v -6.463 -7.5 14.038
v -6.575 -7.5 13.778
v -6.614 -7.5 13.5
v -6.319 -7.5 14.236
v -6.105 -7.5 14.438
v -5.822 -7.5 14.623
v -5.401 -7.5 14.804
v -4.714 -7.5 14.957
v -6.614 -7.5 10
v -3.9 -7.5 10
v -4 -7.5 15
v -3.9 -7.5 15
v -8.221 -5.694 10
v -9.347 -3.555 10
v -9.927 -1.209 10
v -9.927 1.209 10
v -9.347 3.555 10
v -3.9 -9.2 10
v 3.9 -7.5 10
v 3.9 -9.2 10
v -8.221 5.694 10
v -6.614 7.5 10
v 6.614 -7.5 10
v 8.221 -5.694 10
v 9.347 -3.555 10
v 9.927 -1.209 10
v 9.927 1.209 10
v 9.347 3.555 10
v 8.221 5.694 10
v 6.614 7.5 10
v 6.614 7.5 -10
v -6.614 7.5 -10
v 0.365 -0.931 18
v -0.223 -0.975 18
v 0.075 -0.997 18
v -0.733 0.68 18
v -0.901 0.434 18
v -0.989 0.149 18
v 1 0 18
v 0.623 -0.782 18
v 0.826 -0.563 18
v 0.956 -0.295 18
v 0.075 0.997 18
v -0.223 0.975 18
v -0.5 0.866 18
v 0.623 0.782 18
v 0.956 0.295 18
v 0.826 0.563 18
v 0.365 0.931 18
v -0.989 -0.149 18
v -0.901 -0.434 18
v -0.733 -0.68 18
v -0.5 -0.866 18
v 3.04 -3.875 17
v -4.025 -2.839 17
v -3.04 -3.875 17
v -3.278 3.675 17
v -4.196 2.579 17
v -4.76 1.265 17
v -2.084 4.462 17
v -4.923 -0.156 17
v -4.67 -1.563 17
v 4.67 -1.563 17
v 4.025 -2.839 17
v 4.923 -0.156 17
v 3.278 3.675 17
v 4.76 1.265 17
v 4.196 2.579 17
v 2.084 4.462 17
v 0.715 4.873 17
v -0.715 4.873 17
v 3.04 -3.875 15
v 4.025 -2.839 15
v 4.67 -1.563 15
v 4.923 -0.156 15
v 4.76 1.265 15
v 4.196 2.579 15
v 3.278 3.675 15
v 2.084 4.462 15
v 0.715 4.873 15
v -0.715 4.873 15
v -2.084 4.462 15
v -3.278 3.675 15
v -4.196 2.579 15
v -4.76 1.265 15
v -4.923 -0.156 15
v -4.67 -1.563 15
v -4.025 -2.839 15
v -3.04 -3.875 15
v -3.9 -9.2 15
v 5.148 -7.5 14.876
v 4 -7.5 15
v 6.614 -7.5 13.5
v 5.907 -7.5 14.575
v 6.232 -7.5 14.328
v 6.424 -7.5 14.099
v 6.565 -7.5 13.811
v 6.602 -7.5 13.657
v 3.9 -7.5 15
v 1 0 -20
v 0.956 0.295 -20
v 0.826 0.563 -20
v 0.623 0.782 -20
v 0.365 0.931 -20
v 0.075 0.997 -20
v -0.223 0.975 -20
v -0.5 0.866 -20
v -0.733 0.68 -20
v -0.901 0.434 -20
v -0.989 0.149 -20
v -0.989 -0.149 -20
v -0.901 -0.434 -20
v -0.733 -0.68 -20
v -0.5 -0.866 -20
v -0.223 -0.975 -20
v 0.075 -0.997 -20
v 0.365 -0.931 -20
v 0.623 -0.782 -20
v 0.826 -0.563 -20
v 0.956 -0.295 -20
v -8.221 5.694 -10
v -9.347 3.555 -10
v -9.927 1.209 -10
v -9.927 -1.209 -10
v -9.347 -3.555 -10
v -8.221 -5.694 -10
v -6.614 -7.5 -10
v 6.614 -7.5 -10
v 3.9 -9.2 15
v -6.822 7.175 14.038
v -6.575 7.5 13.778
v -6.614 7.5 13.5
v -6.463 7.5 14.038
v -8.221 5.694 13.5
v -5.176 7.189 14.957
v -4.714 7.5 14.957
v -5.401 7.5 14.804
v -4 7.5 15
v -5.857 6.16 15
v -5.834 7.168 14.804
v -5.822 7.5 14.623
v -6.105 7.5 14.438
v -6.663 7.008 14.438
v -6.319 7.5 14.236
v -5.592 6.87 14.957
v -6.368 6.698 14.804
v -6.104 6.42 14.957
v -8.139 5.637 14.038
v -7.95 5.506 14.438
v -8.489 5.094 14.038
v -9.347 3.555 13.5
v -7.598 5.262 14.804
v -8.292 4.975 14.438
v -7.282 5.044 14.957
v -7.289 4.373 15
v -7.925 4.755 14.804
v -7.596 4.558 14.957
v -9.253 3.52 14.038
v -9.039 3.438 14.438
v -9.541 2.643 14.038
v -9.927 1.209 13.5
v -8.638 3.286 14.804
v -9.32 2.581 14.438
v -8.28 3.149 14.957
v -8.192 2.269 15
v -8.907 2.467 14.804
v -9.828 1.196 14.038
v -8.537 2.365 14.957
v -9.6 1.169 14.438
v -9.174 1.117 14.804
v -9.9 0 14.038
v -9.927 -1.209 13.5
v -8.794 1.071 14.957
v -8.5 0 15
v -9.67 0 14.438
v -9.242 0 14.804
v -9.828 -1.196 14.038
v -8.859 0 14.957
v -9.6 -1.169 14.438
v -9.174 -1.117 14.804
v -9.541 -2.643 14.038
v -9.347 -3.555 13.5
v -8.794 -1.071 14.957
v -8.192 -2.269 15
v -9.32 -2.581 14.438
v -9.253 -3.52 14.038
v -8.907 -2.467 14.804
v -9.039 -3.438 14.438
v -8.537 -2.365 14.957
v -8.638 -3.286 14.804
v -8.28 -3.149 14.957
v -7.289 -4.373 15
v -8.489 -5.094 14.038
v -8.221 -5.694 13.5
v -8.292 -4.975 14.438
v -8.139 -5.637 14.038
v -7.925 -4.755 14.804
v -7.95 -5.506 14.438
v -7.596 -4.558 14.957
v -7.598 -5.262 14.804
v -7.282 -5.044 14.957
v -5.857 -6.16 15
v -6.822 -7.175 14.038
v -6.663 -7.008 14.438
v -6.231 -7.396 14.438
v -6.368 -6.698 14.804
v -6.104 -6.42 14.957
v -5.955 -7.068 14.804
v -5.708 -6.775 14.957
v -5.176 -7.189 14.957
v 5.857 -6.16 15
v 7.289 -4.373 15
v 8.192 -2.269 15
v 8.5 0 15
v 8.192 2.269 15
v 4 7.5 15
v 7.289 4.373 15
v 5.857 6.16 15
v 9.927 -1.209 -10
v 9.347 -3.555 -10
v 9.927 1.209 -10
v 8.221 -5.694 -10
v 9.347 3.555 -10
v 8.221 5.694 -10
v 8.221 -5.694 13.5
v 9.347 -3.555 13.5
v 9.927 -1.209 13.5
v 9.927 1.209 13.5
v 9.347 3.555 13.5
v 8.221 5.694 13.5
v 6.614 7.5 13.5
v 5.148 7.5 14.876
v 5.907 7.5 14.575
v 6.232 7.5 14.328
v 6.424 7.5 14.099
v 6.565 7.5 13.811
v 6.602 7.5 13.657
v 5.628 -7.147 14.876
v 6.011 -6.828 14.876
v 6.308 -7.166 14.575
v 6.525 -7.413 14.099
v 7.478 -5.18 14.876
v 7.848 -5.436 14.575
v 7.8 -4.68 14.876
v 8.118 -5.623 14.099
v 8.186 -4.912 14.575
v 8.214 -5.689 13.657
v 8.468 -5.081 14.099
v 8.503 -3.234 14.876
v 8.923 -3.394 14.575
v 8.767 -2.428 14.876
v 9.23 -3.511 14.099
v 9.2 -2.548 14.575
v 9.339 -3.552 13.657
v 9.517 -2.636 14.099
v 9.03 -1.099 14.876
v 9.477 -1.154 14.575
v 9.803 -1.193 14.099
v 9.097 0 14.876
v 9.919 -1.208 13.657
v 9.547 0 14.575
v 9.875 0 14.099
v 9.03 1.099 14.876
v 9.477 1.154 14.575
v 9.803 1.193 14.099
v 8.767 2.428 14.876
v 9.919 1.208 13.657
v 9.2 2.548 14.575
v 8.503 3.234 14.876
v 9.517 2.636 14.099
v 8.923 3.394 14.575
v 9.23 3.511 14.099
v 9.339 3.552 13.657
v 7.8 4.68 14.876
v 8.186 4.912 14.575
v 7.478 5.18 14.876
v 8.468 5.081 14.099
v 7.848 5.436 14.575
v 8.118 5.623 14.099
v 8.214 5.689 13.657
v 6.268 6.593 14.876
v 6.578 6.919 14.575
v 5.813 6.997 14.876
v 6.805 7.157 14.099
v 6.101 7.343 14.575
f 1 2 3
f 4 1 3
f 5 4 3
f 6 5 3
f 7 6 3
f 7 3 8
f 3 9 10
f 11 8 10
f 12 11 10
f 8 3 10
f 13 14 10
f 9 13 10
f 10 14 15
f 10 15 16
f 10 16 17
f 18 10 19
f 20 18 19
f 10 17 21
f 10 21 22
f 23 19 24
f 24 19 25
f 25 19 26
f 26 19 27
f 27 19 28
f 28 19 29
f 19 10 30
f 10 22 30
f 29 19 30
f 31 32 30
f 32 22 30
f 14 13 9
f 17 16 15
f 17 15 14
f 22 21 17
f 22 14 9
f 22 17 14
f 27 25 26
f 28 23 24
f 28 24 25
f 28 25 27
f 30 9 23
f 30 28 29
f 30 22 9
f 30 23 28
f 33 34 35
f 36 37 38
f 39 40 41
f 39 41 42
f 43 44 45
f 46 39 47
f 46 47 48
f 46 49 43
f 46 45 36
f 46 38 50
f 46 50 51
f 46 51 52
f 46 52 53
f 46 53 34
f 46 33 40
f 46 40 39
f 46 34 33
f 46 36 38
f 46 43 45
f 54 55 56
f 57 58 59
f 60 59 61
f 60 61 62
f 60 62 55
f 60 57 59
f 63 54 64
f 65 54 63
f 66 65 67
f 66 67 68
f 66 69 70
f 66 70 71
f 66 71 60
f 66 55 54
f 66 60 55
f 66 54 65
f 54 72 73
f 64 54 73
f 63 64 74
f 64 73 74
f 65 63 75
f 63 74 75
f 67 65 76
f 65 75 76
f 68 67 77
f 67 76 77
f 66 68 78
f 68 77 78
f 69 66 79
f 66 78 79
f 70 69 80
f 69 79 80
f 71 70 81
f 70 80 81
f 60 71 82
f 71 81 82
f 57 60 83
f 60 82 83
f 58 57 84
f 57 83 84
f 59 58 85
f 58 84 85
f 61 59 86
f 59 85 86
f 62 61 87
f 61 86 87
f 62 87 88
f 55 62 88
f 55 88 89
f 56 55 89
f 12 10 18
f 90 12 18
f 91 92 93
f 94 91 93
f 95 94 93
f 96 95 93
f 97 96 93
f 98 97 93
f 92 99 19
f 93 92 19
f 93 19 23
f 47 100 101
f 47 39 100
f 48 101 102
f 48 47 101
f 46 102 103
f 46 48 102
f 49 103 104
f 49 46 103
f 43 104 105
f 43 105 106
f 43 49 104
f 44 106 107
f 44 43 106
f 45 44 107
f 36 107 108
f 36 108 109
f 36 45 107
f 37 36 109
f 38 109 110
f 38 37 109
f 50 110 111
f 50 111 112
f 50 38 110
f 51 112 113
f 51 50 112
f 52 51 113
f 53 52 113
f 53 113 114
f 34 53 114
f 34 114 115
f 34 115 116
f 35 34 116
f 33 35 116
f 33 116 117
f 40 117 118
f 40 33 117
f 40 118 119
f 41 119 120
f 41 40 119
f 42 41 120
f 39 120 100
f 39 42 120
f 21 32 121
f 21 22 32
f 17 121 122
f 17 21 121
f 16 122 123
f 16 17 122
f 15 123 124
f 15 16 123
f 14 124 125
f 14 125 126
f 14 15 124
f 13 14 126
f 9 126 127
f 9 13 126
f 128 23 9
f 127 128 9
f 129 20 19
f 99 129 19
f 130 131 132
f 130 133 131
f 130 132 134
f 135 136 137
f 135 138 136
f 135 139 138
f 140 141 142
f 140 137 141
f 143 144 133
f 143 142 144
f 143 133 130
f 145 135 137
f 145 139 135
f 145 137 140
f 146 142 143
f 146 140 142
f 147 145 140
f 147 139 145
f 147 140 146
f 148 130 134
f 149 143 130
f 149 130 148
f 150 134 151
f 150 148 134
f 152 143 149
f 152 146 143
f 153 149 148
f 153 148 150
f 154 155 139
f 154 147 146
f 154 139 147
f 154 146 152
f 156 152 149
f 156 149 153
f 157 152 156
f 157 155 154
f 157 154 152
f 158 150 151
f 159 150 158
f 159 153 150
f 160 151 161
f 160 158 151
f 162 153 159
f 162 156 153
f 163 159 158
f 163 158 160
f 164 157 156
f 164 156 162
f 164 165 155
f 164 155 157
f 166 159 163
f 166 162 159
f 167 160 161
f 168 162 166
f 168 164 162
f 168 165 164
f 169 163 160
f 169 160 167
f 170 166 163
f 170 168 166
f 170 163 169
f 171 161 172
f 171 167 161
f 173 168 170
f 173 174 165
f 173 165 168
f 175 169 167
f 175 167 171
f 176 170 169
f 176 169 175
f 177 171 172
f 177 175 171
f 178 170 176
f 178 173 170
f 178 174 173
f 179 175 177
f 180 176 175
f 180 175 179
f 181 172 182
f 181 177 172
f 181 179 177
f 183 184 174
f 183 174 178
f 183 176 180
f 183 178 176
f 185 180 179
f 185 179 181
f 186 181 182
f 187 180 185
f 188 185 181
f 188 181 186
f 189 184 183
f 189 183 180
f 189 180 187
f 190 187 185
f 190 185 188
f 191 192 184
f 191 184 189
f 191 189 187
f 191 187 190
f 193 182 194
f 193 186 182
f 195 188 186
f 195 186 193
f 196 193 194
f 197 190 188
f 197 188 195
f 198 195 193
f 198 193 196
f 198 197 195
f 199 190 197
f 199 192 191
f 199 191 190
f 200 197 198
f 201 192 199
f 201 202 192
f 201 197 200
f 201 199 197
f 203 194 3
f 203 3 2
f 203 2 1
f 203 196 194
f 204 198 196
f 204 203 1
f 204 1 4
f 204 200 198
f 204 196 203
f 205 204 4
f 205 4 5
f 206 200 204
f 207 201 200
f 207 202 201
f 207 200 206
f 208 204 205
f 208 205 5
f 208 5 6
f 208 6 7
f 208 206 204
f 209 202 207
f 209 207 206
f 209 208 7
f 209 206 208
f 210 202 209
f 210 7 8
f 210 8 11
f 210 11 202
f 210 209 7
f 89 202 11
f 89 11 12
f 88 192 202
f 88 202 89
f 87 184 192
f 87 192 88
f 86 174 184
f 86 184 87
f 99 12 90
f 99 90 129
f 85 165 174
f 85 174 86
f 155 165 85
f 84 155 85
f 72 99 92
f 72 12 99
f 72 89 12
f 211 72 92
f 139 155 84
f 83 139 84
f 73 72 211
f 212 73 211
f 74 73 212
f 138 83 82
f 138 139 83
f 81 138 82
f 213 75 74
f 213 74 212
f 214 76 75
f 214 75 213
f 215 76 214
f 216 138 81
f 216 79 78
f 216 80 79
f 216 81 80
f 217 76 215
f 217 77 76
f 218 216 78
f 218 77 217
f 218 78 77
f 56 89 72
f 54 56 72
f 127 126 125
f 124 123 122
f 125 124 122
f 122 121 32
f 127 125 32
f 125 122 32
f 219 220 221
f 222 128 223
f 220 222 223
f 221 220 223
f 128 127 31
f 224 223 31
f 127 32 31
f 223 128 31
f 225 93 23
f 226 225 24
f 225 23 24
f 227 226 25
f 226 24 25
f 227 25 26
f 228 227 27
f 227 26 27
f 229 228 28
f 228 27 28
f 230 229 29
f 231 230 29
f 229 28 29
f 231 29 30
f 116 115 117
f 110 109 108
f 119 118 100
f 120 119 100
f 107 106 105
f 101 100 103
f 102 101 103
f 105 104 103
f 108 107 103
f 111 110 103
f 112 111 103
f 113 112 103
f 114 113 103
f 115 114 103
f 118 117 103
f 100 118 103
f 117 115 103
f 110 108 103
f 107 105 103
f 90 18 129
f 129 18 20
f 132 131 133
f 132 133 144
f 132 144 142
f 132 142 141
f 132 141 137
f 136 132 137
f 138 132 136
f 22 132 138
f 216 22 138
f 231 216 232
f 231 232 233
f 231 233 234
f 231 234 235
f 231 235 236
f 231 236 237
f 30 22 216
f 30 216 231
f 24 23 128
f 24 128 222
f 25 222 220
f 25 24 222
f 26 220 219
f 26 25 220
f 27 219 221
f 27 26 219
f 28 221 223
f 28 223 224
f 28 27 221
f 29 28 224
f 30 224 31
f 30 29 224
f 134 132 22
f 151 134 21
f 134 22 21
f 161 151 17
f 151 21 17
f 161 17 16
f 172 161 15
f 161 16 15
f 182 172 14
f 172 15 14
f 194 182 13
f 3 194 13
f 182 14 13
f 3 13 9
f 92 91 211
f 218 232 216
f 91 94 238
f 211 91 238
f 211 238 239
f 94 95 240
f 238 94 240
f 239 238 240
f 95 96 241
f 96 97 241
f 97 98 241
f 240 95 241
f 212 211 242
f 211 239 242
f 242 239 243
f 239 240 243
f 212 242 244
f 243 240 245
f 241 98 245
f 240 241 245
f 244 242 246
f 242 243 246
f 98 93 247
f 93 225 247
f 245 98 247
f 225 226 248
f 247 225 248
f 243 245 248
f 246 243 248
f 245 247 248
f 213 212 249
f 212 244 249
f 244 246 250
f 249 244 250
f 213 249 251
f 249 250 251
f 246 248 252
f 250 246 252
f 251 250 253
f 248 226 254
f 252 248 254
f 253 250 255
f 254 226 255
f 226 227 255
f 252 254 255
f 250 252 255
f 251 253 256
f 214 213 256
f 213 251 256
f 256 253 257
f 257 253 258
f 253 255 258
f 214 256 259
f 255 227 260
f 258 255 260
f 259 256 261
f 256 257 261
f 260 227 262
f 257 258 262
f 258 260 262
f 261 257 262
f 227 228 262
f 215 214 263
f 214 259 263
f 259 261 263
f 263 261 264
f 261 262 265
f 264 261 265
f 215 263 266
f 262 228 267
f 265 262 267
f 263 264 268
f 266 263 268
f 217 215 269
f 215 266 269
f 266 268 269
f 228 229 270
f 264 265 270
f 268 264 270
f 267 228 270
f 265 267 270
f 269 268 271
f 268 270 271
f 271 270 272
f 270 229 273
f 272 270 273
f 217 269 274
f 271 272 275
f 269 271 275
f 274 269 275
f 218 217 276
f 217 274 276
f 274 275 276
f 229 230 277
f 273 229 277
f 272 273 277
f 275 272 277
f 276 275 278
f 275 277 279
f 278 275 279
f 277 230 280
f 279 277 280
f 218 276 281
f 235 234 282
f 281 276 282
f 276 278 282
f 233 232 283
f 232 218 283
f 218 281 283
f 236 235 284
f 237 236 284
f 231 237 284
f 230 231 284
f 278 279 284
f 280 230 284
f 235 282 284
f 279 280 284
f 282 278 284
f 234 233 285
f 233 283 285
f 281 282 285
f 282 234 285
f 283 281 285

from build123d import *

# Parameters (mm, degrees)
PAD_DEPTH         = 10
PAD001_DEPTH      = 5
PAD003_DEPTH      = 2
FILLET_R          = 1.5
SKETCH002_R       = 1
PAD002_DEPTH      = 18
PAD002_DEPTH_BACK = 20


with BuildPart() as metal:
    # Sketch → Pad (new body, symmetric)
    with BuildSketch(Plane.XY):
        with BuildLine():
            ThreePointArc((-6.614378, 7.5), (-10, 0), (-6.614378, -7.5))
            Line((6.614378, -7.5), (-6.614378, -7.5))
            ThreePointArc((6.614378, -7.5), (10, 0), (6.614378, 7.5))
            Line((-6.614378, 7.5), (6.614378, 7.5))
        make_face()
    extrude(amount=PAD_DEPTH, both=True)


with BuildPart() as plastic:
    # Sketch001 → Pad001 (new body)
    with BuildSketch(Plane.XY.offset(10)):
        with BuildLine():
            ThreePointArc((-6.614378, 7.5), (-10, 0), (-6.614378, -7.5))
            Line((-6.614378, -7.5), (-3.9, -7.5))
            Line((-3.9, -7.5), (-3.9, -9.2))
            Line((-3.9, -9.2), (3.9, -9.2))
            Line((3.9, -9.2), (3.9, -7.5))
            Line((3.9, -7.5), (6.614378, -7.5))
            ThreePointArc((6.614378, -7.5), (10, 0), (6.614378, 7.5))
            Line((-6.614378, 7.5), (6.614378, 7.5))
        make_face()
    extrude(amount=PAD001_DEPTH)

    # Sketch003 (on Face10 of Pad001) → Pad003 (join)
    with BuildSketch(Plane.XY.offset(15)):
        with BuildLine():
            ThreePointArc((3.039737, -3.875), (0, 4.925), (-3.039737, -3.875))
            Line((-3.039737, -3.875), (3.039737, -3.875))
        make_face()
    extrude(amount=PAD003_DEPTH)

    # Fillet
    fillet_edges = [plastic.edges().sort_by_distance(p)[0] for p in [
        (10, 0, 15),
        (-10, 0, 15),
    ]]
    fillet(fillet_edges, radius=FILLET_R)


with BuildPart() as axis:
    # Sketch002 → Pad002 (new body, two sides)
    with BuildSketch(Plane.XY) as pad002_sk:
        Circle(SKETCH002_R)
    extrude(amount=PAD002_DEPTH)
    extrude(pad002_sk.sketch, amount=-PAD002_DEPTH_BACK)


solid = Compound([metal.part, plastic.part, axis.part])
